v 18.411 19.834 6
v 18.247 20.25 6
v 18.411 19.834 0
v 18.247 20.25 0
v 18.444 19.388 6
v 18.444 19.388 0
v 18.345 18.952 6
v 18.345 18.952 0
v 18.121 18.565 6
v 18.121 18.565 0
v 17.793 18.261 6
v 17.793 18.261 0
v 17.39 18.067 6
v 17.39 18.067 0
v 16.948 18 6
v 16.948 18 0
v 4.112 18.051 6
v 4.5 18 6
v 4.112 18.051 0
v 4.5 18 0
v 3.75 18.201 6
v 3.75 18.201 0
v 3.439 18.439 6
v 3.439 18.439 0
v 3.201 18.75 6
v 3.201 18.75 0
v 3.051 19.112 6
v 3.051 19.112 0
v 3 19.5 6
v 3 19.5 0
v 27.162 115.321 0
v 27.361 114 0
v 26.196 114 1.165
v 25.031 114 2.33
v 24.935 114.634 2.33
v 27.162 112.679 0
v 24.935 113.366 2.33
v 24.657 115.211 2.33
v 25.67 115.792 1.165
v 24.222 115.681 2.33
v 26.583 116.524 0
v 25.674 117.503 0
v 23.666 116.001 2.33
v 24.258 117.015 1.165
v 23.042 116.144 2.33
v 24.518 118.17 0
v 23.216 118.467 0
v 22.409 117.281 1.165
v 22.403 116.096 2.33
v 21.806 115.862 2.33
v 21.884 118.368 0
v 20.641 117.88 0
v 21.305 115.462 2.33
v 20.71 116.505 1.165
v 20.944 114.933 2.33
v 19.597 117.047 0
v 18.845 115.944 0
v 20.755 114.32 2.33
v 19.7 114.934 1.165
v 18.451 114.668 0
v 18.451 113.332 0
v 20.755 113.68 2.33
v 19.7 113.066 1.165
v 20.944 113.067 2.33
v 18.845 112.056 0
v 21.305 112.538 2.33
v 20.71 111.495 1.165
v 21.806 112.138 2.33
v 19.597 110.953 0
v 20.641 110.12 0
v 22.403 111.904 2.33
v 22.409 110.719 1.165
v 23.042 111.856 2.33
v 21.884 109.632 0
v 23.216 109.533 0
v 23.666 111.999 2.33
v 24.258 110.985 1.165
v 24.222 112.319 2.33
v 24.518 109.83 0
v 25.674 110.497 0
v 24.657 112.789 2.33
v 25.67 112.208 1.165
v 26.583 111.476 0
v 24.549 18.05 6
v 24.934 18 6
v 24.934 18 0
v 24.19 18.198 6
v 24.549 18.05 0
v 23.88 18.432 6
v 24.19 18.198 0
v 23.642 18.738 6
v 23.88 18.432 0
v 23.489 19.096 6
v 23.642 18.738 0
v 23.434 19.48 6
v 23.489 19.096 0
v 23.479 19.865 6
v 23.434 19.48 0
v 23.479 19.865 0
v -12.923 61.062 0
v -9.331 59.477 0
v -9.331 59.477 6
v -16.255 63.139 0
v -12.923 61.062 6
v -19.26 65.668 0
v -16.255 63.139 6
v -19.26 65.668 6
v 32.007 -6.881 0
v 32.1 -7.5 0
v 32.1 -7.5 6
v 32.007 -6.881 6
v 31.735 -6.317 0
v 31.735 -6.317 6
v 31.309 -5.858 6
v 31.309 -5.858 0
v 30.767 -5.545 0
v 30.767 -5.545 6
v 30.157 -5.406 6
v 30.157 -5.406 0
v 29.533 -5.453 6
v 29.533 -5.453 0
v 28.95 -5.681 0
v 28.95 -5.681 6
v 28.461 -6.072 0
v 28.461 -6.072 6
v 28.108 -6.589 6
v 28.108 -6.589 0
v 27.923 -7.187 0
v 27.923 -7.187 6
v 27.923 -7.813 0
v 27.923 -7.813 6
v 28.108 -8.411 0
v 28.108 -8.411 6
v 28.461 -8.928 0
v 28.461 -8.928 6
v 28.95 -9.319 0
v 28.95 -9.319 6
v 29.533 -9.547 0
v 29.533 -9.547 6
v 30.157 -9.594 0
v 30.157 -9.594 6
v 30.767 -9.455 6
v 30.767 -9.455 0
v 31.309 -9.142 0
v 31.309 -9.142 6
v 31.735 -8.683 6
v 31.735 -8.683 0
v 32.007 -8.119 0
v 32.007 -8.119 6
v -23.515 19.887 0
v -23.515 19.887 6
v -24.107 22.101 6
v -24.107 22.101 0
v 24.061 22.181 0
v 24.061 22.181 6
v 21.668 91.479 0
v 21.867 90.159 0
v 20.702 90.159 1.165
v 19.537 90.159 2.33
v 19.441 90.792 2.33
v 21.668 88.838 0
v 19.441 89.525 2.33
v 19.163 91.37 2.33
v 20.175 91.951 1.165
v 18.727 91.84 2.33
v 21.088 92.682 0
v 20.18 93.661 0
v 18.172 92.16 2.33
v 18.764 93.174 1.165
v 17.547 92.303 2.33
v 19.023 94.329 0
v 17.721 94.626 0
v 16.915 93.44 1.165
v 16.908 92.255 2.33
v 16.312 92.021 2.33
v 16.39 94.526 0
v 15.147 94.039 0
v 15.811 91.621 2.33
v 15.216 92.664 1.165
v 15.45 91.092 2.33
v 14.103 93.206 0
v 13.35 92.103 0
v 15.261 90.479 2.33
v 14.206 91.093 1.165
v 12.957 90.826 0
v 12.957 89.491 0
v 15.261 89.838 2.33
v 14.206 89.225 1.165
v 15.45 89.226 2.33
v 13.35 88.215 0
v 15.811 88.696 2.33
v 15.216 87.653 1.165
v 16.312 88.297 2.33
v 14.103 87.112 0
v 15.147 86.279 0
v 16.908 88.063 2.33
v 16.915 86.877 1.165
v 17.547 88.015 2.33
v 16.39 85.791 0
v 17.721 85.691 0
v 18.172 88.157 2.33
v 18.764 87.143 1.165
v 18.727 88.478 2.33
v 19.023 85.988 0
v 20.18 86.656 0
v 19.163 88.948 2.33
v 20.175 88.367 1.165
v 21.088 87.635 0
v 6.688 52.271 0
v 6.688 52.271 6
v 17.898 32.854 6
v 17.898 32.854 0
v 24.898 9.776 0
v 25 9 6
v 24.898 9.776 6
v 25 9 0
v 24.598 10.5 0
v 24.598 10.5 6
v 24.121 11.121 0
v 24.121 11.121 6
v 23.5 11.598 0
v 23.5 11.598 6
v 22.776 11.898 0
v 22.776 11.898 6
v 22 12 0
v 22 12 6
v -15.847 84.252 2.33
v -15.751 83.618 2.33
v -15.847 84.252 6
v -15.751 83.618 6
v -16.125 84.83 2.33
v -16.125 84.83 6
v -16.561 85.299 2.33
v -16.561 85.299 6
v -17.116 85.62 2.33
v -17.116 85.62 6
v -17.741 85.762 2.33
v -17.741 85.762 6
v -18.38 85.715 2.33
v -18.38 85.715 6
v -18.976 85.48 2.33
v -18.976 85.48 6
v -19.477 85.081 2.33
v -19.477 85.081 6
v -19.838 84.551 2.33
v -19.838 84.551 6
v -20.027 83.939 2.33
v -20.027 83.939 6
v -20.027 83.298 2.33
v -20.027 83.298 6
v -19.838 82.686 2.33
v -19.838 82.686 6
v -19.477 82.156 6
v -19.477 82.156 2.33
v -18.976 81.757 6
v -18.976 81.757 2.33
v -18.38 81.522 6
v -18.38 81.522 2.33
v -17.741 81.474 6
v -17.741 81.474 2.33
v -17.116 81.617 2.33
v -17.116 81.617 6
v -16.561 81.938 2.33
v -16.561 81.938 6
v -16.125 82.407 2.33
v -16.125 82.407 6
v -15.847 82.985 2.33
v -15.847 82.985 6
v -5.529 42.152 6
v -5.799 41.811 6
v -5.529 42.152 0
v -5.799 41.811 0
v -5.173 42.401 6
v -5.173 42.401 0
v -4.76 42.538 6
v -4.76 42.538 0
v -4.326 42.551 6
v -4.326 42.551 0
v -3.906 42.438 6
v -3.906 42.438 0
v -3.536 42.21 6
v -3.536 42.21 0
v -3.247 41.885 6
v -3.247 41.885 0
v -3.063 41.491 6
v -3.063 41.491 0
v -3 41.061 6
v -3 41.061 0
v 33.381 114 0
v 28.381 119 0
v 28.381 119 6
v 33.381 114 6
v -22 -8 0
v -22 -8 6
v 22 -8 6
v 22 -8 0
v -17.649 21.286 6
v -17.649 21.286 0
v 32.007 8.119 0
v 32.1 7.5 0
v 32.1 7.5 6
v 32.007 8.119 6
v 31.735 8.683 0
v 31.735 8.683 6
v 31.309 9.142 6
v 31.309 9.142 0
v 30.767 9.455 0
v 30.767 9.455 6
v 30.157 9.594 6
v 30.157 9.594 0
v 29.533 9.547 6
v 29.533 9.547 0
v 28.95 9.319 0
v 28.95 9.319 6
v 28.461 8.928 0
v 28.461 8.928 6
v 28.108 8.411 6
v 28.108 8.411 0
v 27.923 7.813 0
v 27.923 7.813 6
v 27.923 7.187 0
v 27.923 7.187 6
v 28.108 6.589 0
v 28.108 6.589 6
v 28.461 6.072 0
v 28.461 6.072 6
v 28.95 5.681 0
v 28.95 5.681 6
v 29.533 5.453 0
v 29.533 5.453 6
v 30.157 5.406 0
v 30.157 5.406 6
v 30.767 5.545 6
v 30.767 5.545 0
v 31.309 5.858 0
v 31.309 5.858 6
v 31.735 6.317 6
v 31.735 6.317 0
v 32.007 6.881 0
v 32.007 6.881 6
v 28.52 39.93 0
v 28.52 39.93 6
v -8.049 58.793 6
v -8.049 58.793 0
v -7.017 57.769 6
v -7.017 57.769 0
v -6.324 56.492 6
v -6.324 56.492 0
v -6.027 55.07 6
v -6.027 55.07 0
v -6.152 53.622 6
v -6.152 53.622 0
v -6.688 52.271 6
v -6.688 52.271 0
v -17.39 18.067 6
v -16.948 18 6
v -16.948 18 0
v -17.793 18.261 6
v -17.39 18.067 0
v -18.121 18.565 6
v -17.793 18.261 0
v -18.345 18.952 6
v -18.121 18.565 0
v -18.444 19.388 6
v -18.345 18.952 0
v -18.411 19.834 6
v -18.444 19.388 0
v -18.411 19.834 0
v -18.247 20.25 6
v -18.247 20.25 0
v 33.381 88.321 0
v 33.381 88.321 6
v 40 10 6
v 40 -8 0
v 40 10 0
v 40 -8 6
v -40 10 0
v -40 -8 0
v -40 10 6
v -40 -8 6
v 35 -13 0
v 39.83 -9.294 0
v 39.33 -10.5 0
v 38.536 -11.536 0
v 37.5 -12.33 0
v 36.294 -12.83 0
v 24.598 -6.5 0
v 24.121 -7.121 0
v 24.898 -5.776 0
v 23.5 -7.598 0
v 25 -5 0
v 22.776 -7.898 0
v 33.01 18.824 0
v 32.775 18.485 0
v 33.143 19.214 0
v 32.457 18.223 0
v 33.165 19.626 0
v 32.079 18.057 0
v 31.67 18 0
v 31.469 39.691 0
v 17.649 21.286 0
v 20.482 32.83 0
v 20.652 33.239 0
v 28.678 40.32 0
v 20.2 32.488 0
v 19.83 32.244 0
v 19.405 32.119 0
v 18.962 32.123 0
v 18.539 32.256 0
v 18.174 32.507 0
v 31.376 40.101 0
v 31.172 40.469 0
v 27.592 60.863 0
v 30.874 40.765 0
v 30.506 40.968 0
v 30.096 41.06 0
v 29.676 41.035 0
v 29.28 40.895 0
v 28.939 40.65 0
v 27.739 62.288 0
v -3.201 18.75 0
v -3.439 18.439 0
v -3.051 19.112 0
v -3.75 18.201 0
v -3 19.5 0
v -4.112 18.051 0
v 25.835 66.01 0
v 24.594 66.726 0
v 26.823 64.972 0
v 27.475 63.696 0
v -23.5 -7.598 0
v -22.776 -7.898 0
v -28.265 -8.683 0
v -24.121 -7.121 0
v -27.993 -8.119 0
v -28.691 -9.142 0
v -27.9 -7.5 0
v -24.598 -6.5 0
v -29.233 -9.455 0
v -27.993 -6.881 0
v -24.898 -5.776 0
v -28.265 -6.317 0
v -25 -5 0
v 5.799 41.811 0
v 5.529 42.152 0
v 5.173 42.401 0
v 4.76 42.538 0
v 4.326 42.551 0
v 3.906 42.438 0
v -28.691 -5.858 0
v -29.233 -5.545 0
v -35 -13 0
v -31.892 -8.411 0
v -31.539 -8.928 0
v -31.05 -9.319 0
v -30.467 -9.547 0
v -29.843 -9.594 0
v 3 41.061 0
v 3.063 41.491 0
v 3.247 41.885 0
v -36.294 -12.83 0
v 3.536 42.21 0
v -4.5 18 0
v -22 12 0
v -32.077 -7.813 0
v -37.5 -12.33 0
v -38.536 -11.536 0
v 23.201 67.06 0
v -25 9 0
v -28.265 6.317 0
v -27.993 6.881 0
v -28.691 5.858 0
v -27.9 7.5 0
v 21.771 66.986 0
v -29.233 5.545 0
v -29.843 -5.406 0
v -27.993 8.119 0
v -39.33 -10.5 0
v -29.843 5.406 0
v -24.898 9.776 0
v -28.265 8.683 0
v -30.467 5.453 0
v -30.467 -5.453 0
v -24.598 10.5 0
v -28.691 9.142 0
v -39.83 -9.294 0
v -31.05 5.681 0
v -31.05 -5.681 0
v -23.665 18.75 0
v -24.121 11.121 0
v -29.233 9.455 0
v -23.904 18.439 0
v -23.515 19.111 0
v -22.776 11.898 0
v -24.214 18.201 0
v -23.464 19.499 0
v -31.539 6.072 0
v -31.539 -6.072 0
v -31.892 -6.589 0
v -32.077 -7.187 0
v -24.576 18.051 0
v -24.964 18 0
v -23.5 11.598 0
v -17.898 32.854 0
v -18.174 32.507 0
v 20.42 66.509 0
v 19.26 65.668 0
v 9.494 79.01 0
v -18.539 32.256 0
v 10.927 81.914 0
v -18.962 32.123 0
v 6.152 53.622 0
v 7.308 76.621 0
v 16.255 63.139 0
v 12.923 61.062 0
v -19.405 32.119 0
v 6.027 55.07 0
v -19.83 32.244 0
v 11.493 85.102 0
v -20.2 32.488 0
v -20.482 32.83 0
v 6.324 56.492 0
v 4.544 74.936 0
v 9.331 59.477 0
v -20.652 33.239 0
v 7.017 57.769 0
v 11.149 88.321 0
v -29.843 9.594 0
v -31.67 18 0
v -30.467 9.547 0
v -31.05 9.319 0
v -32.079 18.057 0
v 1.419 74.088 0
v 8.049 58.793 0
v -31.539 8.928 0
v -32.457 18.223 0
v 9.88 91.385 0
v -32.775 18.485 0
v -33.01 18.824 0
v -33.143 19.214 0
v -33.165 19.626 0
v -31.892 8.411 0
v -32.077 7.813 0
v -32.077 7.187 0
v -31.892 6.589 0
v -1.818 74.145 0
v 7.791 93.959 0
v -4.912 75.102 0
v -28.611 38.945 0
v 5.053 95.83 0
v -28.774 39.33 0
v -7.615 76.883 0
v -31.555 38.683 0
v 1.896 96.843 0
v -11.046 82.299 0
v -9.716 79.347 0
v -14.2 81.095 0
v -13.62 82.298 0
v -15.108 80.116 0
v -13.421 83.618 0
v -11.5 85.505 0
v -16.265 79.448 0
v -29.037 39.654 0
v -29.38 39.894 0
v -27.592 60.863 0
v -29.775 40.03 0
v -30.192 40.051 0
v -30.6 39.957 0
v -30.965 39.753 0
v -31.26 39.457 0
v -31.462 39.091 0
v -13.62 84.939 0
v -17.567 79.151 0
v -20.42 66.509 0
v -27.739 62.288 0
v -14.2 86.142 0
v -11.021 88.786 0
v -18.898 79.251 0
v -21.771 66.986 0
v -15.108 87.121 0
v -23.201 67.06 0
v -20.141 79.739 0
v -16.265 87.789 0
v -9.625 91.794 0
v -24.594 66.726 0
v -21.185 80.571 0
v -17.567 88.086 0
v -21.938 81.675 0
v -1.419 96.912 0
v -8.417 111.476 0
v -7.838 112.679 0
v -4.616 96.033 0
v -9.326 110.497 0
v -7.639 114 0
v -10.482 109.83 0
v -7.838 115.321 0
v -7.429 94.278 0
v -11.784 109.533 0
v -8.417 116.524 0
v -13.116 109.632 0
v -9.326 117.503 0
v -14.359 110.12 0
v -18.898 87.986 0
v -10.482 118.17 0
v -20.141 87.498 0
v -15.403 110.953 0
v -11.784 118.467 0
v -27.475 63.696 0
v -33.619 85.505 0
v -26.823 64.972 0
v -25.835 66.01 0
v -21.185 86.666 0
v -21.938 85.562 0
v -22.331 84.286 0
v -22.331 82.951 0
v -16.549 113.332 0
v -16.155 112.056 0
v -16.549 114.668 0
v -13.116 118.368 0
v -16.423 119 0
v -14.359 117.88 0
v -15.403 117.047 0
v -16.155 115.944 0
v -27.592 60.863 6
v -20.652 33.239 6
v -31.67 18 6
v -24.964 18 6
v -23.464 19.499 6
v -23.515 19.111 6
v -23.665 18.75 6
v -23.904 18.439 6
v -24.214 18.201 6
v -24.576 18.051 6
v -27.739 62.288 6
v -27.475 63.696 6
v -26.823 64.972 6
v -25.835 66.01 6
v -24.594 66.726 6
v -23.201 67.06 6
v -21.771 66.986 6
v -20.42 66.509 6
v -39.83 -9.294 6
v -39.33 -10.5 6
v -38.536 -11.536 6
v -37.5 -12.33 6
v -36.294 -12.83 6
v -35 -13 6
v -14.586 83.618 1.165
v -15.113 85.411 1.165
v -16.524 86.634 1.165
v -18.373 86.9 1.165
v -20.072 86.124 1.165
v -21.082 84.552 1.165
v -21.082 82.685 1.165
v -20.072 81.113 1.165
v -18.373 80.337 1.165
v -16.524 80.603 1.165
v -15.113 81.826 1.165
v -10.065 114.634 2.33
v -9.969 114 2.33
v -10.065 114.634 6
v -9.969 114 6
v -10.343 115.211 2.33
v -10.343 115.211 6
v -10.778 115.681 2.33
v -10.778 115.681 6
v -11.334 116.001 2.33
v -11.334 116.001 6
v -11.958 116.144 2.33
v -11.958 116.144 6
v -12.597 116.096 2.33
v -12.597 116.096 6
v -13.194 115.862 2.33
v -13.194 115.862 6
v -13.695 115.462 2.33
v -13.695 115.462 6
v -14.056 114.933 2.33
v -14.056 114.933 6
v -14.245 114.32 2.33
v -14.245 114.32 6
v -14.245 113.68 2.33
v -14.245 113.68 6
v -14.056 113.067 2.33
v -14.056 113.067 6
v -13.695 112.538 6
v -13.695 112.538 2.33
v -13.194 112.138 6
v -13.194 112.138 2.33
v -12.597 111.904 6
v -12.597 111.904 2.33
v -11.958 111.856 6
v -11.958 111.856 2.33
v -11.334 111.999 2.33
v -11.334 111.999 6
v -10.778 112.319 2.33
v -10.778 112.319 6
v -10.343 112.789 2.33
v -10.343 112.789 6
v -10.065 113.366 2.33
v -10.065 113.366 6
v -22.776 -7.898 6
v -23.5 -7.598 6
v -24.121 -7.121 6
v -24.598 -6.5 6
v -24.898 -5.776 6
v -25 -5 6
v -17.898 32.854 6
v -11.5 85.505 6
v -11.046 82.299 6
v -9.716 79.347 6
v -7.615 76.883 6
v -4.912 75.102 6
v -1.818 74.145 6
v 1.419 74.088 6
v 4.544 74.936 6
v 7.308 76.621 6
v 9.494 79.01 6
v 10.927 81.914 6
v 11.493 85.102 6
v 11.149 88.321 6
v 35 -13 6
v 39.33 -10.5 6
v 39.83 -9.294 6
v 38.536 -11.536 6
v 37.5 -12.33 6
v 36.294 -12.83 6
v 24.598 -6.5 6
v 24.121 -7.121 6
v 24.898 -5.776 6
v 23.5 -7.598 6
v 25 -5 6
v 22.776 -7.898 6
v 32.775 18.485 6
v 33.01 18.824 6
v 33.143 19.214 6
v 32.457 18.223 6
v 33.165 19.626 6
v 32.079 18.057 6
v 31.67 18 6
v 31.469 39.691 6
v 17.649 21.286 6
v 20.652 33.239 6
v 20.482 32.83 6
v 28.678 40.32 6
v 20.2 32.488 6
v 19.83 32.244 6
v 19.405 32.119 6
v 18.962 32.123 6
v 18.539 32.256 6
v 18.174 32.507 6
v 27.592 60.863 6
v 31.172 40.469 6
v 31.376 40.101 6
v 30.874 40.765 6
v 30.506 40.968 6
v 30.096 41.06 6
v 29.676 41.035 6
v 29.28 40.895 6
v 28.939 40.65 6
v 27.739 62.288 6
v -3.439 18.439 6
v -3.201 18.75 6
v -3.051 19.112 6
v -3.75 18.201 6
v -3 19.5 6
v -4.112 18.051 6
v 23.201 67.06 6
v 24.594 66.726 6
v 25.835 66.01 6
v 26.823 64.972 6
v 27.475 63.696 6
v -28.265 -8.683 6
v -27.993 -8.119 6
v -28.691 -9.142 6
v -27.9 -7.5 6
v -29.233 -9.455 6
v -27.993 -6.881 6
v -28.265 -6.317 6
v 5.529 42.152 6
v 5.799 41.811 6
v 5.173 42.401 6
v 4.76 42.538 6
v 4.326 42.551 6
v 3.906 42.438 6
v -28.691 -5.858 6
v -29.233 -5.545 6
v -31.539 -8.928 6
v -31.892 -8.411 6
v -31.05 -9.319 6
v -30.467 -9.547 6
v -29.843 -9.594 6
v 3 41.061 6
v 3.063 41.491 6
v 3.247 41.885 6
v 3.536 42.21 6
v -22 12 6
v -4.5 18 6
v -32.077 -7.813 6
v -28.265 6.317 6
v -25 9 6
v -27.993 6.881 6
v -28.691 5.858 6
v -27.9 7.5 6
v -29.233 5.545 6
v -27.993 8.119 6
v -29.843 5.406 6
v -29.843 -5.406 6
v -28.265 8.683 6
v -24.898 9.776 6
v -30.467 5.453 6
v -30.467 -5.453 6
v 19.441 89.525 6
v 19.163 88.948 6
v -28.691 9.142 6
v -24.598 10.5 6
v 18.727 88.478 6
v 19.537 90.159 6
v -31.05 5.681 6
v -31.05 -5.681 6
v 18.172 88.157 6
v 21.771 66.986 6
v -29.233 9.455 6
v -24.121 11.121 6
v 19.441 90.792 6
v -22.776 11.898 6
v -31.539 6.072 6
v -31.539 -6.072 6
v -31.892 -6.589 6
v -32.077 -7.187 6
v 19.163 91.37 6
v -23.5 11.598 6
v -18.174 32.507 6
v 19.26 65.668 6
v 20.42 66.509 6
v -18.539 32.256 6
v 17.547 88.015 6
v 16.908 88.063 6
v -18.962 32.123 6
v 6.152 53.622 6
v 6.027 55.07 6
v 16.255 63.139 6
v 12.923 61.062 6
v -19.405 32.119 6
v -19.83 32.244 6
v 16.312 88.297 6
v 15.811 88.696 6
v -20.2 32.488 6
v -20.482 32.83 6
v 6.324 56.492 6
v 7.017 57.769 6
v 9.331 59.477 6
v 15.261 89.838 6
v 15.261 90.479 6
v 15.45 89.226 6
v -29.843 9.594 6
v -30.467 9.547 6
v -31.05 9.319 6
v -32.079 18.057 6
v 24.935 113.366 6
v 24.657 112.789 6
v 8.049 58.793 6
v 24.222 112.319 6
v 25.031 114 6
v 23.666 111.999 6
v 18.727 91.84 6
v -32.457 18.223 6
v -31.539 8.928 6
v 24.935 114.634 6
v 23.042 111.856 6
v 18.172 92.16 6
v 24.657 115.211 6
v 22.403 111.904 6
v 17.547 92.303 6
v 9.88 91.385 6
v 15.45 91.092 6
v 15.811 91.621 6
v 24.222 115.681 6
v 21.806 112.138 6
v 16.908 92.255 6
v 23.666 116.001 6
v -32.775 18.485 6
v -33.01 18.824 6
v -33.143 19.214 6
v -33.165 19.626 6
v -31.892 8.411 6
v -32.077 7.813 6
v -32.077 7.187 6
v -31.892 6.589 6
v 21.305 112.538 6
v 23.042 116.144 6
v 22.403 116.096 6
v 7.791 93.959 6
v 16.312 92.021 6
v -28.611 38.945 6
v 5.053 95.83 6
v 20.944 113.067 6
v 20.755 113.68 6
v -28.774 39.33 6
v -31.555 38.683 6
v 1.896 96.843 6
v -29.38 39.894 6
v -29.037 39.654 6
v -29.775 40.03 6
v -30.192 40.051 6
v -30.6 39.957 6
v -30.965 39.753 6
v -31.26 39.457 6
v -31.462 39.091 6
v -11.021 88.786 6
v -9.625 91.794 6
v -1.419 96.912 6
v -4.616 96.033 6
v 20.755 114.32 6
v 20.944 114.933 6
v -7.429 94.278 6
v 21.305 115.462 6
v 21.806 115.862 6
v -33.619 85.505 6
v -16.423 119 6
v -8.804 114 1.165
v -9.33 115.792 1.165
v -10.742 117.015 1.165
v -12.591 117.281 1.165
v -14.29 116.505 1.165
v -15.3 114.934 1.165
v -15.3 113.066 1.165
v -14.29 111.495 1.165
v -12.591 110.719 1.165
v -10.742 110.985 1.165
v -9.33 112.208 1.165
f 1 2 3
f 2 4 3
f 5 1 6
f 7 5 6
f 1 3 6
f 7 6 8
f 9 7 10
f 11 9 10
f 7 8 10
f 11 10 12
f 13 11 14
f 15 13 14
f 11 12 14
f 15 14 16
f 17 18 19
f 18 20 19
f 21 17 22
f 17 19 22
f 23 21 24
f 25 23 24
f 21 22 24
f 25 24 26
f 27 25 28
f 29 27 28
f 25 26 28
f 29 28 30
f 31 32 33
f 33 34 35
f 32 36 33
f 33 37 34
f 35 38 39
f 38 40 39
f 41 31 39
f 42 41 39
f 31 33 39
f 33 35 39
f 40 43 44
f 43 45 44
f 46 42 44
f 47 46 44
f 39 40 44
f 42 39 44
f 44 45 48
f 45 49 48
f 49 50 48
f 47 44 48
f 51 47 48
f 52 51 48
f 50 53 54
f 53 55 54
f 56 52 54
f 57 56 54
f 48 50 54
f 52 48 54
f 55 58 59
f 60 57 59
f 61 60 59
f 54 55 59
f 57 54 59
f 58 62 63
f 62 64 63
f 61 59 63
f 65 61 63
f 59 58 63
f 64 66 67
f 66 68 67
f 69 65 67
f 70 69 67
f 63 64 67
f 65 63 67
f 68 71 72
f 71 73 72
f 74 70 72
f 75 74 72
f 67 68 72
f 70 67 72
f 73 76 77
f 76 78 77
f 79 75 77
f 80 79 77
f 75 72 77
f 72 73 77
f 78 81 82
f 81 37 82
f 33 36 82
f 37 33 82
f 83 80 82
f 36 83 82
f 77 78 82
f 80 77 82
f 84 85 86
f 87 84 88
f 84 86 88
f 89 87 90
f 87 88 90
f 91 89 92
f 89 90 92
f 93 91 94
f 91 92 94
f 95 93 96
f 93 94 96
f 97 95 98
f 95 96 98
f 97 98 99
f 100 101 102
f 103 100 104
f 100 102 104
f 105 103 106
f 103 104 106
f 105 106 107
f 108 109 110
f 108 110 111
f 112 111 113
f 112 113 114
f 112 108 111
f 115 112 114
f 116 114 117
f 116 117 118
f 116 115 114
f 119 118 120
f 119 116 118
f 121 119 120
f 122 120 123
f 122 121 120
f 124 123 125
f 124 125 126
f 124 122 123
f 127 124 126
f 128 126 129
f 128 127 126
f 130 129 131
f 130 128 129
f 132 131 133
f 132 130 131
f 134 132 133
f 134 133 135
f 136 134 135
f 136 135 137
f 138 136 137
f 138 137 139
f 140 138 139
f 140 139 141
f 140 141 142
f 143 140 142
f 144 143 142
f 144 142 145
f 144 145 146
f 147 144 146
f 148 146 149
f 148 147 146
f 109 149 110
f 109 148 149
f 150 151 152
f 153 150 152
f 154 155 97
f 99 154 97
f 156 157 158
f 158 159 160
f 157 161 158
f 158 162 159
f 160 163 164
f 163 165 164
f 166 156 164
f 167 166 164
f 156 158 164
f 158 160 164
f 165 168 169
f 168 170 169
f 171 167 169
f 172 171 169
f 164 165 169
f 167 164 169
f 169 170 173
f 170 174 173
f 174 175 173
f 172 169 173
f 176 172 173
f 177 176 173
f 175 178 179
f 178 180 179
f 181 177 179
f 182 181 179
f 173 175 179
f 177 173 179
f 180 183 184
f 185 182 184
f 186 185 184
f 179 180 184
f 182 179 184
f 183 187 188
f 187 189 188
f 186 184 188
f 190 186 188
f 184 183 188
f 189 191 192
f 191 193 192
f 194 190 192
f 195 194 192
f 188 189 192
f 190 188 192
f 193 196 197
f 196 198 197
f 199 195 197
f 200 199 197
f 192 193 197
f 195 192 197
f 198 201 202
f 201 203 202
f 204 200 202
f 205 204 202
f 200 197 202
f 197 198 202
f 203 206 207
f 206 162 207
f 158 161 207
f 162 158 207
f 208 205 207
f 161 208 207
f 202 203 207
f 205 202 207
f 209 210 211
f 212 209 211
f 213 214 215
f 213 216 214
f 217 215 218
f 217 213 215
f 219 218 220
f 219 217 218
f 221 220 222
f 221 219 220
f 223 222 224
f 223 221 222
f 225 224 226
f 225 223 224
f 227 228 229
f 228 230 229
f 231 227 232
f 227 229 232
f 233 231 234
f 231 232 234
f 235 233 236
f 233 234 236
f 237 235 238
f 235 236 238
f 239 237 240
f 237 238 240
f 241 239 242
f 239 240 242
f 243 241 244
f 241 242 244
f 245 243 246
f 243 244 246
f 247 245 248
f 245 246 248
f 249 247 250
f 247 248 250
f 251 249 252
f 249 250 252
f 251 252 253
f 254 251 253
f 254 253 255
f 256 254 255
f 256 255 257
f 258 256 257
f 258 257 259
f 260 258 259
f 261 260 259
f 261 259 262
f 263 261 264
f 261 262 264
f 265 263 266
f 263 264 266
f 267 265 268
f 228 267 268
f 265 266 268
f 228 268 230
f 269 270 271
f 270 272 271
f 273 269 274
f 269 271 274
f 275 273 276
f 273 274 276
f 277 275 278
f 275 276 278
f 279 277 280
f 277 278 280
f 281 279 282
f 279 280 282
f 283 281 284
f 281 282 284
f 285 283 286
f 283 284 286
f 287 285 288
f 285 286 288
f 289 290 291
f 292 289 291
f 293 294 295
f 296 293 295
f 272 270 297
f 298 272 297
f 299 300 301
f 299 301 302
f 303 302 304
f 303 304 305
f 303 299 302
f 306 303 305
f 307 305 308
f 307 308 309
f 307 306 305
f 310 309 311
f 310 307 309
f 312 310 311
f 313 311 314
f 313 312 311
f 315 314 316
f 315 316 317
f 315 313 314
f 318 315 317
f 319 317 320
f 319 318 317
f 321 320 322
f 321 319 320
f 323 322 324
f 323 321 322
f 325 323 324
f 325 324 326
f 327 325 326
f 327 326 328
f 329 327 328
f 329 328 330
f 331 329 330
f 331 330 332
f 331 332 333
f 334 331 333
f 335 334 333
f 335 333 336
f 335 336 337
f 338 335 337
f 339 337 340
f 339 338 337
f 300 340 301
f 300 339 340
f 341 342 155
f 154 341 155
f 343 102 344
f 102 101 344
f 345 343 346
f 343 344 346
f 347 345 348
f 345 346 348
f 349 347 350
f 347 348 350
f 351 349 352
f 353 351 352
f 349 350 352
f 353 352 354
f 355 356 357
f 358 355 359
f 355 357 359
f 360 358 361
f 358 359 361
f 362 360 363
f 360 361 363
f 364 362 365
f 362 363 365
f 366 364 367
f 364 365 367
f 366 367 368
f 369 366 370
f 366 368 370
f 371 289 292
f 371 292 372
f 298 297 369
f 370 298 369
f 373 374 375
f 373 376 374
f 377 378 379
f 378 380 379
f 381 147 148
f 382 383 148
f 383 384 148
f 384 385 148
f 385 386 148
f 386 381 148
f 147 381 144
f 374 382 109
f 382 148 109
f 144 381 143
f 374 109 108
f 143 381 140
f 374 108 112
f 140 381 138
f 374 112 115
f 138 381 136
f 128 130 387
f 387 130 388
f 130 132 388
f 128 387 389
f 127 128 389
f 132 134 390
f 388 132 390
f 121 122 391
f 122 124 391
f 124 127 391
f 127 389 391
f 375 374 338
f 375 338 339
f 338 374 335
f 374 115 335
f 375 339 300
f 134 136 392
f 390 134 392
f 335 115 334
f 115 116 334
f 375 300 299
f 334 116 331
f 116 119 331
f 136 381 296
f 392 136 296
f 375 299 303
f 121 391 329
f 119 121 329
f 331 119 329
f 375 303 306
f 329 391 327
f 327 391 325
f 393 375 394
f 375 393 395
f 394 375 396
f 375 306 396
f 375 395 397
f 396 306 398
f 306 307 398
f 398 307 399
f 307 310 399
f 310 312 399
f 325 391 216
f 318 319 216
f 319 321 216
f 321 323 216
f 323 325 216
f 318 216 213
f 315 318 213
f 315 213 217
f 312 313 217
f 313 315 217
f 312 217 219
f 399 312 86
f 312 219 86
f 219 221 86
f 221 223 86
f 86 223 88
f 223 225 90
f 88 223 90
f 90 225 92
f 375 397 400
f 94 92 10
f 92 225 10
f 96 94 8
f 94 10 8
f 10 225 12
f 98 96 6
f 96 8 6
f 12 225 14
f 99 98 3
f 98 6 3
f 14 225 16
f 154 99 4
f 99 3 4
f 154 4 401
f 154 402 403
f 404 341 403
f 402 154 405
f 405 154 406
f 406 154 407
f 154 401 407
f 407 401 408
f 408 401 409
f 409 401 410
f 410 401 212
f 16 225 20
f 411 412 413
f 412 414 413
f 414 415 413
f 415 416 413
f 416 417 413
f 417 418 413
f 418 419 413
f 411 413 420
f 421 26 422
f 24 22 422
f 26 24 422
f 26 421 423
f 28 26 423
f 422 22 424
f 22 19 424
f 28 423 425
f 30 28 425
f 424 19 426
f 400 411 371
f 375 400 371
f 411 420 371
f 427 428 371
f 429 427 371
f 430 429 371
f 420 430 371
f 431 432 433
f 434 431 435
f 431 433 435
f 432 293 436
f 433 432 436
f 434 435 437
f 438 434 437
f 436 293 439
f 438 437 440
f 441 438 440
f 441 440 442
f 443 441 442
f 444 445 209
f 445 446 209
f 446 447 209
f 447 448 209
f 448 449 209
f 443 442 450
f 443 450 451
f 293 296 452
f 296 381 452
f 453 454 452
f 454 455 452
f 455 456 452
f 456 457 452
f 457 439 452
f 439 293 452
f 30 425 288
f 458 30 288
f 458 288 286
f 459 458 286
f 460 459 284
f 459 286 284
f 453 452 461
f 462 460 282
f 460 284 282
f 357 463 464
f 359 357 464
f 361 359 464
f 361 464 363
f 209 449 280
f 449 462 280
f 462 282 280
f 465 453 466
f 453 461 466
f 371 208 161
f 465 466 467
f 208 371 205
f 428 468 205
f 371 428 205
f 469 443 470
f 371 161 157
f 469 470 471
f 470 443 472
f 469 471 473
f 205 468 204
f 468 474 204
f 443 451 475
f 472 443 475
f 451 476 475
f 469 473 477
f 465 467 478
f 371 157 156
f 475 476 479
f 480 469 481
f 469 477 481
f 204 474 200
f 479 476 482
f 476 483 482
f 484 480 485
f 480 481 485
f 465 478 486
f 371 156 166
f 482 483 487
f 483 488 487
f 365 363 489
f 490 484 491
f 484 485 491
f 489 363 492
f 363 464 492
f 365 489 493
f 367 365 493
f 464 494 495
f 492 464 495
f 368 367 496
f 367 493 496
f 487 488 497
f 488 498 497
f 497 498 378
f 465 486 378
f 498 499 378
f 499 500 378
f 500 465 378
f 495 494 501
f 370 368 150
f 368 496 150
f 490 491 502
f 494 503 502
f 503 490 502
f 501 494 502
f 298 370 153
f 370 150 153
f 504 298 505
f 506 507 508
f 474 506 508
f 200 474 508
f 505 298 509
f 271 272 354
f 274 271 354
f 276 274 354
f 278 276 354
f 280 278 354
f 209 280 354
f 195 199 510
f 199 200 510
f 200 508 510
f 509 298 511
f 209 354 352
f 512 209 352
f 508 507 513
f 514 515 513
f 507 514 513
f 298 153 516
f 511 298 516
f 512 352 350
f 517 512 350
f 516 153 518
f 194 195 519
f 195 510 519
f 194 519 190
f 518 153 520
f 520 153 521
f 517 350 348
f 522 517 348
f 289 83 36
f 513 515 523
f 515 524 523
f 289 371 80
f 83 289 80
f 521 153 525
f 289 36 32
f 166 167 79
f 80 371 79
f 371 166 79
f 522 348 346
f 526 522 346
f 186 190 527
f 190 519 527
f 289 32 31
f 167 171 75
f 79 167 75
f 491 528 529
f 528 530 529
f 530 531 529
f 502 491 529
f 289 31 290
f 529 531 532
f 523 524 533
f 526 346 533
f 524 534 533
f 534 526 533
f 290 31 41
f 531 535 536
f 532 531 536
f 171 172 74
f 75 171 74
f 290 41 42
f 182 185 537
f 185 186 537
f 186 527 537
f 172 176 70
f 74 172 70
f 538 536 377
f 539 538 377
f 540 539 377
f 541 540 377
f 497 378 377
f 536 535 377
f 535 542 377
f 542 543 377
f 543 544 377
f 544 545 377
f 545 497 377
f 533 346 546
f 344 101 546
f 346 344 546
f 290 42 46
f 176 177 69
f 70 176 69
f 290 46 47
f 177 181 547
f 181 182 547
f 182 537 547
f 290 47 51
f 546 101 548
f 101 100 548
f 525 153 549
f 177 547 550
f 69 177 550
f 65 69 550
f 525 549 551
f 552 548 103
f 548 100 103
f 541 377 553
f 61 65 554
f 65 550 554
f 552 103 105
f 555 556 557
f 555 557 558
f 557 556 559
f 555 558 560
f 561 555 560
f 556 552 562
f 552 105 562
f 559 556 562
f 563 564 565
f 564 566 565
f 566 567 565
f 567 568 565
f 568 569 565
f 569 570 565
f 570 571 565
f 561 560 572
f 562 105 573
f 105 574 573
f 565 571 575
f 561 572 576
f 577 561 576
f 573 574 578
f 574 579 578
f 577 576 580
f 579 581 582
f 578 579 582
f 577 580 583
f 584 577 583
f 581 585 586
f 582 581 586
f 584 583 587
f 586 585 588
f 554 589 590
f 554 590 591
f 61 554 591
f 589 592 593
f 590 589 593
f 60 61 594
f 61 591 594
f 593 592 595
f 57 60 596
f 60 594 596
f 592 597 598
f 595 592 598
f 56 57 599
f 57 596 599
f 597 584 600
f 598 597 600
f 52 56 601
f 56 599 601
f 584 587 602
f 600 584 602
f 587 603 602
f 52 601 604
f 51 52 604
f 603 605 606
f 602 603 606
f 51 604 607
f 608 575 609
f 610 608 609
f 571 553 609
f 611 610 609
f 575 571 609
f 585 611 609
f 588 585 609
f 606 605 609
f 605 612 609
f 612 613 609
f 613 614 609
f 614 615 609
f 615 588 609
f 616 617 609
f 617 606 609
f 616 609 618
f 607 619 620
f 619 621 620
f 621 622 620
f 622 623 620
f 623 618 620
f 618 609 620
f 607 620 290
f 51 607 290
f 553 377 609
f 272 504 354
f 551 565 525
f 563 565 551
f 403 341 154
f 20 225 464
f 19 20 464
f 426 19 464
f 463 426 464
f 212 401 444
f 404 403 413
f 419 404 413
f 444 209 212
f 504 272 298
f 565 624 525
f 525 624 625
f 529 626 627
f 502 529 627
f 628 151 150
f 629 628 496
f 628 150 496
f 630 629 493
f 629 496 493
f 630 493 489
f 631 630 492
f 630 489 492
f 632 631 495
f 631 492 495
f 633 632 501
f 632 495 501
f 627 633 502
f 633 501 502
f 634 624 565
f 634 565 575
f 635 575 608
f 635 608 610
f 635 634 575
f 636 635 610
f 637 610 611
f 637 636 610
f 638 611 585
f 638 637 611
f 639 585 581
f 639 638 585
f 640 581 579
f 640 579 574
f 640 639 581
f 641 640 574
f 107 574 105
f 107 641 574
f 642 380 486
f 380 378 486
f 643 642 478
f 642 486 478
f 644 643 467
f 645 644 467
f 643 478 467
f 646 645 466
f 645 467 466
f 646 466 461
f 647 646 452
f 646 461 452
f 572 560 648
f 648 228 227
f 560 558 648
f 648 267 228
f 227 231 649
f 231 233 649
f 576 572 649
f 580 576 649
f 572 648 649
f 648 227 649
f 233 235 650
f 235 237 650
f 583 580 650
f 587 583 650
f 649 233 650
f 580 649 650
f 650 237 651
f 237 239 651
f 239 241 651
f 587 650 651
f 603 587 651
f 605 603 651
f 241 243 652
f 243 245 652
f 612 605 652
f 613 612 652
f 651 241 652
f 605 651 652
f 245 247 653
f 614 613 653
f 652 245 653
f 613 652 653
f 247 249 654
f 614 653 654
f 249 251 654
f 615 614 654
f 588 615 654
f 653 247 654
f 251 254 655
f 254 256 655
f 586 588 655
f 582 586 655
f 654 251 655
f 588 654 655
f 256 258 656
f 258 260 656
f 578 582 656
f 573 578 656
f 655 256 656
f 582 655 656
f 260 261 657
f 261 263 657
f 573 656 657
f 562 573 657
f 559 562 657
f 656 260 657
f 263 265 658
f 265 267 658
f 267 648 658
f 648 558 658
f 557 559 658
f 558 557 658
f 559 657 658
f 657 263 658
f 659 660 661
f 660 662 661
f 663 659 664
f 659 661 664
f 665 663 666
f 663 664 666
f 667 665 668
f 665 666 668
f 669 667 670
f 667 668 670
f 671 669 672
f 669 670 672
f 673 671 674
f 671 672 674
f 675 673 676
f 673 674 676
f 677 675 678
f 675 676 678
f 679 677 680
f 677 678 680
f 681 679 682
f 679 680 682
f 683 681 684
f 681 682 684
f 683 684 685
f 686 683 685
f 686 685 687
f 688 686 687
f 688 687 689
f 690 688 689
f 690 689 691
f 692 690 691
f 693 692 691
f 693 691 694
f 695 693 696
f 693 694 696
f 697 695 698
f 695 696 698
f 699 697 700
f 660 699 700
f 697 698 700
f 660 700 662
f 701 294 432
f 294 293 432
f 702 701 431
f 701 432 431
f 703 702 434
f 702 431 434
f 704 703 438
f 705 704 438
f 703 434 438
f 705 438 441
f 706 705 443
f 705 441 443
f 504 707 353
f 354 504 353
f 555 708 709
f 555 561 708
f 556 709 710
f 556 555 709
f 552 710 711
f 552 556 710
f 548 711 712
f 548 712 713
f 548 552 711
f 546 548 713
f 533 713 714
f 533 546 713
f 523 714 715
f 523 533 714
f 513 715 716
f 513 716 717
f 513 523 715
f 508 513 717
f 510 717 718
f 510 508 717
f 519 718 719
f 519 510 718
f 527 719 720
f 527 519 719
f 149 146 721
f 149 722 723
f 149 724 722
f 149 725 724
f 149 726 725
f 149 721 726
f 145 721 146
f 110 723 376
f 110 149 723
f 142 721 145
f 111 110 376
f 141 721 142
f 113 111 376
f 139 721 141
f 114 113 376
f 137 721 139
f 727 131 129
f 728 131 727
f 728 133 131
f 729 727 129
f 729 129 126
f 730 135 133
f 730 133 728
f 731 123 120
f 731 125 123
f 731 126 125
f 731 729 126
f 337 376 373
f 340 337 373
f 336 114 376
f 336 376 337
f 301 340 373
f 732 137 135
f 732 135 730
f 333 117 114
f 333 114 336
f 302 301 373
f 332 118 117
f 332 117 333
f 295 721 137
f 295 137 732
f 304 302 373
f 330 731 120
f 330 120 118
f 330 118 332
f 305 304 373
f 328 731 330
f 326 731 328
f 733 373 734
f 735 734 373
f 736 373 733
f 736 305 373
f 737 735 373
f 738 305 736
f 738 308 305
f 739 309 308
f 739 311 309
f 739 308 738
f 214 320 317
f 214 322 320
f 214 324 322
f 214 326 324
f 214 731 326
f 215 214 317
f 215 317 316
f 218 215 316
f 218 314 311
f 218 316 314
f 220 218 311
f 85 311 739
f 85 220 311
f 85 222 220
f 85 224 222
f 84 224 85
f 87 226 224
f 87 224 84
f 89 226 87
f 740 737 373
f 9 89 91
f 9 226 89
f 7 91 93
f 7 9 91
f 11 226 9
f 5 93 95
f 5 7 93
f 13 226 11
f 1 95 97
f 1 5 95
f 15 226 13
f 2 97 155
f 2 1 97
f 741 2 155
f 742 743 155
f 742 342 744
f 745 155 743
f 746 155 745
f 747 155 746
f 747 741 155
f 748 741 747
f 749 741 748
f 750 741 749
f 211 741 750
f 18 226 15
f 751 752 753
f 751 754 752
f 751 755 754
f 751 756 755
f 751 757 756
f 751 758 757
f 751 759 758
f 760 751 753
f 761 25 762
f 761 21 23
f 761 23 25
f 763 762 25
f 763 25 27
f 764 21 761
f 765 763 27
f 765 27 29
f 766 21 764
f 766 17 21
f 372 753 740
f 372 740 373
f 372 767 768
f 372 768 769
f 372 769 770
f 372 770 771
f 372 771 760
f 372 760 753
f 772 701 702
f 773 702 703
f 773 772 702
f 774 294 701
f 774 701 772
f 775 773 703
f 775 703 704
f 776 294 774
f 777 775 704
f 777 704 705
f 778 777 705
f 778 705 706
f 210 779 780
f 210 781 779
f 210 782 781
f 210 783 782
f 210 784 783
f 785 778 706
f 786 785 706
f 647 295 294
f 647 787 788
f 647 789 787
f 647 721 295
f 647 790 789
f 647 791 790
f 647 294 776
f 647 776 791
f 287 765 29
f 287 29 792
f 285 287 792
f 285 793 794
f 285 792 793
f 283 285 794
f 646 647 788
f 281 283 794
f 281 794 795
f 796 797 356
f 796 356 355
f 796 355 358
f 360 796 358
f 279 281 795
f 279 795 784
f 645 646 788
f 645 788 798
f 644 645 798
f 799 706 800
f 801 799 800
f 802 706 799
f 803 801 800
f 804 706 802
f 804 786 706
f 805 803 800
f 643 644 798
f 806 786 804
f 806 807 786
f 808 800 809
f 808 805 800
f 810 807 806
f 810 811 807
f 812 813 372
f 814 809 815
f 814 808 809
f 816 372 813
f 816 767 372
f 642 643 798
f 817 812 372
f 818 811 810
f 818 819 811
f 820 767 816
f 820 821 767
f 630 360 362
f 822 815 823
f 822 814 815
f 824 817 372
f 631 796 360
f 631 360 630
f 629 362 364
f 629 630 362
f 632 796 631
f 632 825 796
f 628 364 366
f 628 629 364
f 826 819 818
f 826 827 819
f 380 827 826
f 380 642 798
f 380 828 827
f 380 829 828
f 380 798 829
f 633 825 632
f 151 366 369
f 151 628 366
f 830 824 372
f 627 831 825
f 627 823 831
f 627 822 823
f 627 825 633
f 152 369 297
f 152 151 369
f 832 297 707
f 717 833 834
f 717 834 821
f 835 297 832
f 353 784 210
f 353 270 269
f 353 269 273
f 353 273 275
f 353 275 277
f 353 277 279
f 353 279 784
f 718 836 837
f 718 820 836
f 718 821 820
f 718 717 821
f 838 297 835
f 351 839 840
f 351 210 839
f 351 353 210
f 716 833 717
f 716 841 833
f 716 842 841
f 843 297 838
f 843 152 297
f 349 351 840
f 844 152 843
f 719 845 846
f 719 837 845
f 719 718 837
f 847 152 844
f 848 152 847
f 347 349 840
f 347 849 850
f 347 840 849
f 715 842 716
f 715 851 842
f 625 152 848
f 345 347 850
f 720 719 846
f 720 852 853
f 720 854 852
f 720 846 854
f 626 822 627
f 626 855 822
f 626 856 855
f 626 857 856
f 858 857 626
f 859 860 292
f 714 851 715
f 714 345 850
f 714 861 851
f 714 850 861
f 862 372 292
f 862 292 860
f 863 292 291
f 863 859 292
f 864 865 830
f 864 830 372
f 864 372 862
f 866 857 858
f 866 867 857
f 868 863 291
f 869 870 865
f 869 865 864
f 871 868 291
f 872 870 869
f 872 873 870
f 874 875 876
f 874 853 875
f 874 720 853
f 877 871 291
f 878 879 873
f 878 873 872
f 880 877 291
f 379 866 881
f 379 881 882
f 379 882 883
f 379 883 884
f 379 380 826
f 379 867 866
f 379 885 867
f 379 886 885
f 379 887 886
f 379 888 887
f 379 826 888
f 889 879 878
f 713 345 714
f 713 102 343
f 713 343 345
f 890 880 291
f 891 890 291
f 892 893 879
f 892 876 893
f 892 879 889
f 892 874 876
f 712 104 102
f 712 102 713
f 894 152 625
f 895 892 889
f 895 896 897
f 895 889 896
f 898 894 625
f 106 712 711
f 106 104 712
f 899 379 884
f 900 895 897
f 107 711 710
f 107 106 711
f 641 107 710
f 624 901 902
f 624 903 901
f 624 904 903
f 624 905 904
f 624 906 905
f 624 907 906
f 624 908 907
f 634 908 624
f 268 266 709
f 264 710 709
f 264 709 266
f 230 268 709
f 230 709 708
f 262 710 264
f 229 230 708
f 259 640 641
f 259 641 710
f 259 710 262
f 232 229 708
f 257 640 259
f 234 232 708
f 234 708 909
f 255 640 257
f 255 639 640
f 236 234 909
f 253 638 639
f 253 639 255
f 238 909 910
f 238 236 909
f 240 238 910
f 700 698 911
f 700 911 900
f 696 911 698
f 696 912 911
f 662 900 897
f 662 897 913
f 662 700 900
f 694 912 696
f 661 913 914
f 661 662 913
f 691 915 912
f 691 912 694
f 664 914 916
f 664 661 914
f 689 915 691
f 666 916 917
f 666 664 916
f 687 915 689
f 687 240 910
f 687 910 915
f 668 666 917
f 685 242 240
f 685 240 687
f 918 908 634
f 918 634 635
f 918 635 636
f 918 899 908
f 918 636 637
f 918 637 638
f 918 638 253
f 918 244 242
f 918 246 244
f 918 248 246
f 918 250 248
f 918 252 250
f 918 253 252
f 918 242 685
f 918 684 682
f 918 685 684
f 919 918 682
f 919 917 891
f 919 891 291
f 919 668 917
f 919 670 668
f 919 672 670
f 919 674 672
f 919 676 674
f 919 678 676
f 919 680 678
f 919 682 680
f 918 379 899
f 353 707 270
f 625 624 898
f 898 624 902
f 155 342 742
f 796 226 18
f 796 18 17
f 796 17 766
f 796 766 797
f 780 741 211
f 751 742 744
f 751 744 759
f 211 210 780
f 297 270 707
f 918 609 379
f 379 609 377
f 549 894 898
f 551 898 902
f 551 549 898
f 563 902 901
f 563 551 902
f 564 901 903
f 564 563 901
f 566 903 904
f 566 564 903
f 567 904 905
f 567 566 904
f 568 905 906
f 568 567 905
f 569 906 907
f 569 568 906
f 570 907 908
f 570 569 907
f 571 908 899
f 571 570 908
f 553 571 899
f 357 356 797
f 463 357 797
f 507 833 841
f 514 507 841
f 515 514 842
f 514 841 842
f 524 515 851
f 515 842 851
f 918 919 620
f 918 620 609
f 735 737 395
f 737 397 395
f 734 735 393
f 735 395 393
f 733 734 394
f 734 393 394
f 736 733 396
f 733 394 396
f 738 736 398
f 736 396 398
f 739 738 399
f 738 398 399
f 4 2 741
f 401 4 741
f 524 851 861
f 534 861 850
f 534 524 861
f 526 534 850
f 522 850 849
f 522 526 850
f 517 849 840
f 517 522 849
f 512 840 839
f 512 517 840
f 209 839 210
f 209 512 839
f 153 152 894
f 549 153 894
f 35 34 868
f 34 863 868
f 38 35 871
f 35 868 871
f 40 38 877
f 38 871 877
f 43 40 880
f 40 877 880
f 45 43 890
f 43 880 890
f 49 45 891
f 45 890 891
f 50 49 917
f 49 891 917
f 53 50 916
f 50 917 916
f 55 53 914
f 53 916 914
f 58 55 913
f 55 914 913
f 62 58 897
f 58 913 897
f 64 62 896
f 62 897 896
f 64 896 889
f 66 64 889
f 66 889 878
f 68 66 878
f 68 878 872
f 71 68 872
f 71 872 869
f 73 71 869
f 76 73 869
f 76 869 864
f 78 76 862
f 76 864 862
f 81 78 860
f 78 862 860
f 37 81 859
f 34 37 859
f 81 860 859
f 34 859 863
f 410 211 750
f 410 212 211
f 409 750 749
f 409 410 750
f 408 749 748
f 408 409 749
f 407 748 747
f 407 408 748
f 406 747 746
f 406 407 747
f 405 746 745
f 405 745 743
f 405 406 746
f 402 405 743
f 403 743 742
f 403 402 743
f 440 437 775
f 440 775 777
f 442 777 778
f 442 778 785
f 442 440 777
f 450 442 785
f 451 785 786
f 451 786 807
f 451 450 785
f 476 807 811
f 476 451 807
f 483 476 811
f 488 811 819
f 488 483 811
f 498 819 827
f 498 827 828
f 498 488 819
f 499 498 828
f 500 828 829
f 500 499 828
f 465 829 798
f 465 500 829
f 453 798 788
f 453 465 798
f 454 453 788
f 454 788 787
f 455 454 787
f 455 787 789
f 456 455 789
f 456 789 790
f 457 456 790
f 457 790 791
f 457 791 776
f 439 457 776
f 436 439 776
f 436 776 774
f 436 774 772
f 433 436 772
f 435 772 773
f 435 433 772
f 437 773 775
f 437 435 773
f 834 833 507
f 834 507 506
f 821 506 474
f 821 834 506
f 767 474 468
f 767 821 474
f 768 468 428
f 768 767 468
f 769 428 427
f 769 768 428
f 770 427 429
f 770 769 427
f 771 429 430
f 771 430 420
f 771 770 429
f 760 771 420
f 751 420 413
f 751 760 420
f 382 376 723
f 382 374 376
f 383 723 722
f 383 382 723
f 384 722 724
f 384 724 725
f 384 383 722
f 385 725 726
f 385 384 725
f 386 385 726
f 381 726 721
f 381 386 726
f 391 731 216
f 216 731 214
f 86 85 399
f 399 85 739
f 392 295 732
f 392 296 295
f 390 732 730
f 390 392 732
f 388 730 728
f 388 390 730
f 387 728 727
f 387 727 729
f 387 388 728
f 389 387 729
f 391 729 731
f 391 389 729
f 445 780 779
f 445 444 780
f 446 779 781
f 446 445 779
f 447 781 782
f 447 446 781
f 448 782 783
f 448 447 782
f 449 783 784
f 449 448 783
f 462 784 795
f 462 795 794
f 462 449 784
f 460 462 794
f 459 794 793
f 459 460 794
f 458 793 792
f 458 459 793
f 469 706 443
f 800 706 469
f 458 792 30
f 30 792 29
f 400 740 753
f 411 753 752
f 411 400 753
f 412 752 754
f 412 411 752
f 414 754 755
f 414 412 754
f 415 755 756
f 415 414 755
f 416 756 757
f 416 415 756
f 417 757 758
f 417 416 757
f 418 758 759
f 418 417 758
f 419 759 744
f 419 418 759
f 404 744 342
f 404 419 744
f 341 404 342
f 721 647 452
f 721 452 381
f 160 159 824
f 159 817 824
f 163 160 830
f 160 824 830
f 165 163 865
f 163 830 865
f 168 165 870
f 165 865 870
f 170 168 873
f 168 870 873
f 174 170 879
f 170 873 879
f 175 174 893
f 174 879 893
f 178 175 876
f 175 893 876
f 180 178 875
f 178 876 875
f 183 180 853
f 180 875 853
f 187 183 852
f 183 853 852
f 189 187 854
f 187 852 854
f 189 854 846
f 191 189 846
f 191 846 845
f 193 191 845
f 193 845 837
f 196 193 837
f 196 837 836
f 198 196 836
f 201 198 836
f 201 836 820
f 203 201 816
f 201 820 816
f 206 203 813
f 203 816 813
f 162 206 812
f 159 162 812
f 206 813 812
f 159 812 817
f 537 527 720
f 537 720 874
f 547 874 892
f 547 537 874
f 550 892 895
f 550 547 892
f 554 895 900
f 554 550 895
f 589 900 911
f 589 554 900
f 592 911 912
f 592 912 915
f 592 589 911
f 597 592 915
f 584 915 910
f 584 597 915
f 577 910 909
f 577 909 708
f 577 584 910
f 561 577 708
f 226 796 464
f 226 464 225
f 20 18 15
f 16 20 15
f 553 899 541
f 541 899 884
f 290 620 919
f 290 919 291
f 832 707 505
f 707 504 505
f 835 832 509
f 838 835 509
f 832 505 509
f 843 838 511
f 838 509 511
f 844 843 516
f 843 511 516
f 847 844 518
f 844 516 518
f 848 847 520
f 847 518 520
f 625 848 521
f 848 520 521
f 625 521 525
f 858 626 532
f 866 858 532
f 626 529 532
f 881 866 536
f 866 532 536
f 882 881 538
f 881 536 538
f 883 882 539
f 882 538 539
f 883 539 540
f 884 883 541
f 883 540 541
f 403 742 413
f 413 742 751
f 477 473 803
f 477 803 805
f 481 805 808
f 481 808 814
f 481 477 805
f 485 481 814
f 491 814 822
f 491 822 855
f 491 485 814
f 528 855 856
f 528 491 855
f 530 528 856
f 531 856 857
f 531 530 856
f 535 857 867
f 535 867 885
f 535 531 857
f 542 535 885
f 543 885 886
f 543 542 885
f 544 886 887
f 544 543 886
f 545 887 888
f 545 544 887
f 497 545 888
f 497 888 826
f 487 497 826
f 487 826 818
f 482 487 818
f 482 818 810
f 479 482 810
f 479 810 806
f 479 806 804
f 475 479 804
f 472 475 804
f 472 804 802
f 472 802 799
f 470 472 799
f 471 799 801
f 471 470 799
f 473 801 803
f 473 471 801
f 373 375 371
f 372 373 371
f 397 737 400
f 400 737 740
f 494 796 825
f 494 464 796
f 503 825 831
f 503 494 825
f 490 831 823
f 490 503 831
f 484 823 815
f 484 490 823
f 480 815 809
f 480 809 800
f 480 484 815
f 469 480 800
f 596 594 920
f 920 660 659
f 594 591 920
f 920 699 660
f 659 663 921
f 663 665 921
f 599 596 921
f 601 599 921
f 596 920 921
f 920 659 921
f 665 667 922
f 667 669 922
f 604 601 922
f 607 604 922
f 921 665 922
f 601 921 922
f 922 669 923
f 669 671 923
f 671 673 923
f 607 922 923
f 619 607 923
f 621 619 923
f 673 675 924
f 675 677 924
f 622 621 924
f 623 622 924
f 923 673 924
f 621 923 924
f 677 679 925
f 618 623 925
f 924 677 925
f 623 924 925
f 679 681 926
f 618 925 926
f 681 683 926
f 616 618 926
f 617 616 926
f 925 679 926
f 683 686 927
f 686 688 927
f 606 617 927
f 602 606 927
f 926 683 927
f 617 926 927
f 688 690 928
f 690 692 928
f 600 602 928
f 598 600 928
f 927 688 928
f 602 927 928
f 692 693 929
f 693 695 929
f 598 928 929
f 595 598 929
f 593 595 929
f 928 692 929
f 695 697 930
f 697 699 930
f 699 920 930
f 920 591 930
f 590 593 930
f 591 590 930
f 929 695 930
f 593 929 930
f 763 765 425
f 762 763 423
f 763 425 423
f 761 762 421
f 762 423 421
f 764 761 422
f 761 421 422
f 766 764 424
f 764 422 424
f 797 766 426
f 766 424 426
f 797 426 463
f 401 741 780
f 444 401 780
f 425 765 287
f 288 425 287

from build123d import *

# Parameters (mm, degrees)
SKETCH_1_R                   = 33.5
SKETCH_1_R_2                 = 11.5
SKETCH_1_W                   = 80
SKETCH_1_H                   = 20
SKETCH_1_R_3                 = 2.1
EXTRUDE_1_DEPTH              = 6
SKETCH_3_W                   = 80
SKETCH_3_H                   = 3
EXTRUDE_2_DEPTH              = 6
FILLET_1_R                   = 5
EXTRUDE_START                = -6
EXTRUDE_3_DEPTH              = 6
SKETCH_5_R                   = 2
CUT_EXTRUDE_1_DEPTH          = 126.686116974
HOLE_WIZARD_M4_1_D           = 4.3
HOLE_WIZARD_M4_1_DEPTH       = 10
HOLE_WIZARD_M4_1_CSINK_D     = 8.96
HOLE_WIZARD_M4_1_CSINK_ANGLE = 90
HOLE_WIZARD_M4_1_TIP         = 1.291850331
SKETCH_8_R                   = 2.1
CUT_EXTRUDE_2_DEPTH          = 10
HOLE_WIZARD_M4_2_D           = 4.3
HOLE_WIZARD_M4_2_DEPTH       = 10
HOLE_WIZARD_M4_2_CSINK_D     = 8.96
HOLE_WIZARD_M4_2_CSINK_ANGLE = 90
HOLE_WIZARD_M4_2_TIP         = 1.291850331
CHAMFER_1_SIZE               = 5
CUT_EXTRUDE_3_DEPTH          = 126.686116974
SKETCH_13_W                  = 50
SKETCH_13_H                  = 20
CUT_EXTRUDE_5_DEPTH          = 10
FILLET_3_R                   = 3
FILLET_4_R                   = 6
FILLET_5_R                   = 5
FILLET_6_R                   = 1.5
FILLET_7_R                   = 5


with BuildPart() as part:
    # 草图1 → 凸台-拉伸1 (new body)
    # profile 1 of 3: a face of its own
    with BuildSketch(Plane.XY):
        with Locations((0, 85.5)):
            Circle(SKETCH_1_R)
        with Locations((0, 85.5)):
            Circle(SKETCH_1_R_2, mode=Mode.SUBTRACT)
    # profile 2 of 3: a face of its own
    with BuildSketch(Plane.XY):
        with BuildLine():
            Line((-33.38100662, 88.32106311), (-40, 10))
            Line((-40, 10), (40, 10))
            Line((40, 10), (33.38100662, 88.32106311))
            ThreePointArc((33.38100662, 88.32106311), (33.470238435, 86.911785792), (33.5, 85.5))
            ThreePointArc((33.5, 85.5), (-1.411785792, 52.029761565), (-33.38100662, 88.32106311))
        make_face()
    # profile 3 of 3: a face of its own
    with BuildSketch(Plane.XY):
        Rectangle(SKETCH_1_W, SKETCH_1_H)
        with Locations((-30, 7.5)):
            Circle(SKETCH_1_R_3, mode=Mode.SUBTRACT)
        with Locations((30, 7.5)):
            Circle(SKETCH_1_R_3, mode=Mode.SUBTRACT)
        with Locations((30, -7.5)):
            Circle(SKETCH_1_R_3, mode=Mode.SUBTRACT)
        with Locations((-30, -7.5)):
            Circle(SKETCH_1_R_3, mode=Mode.SUBTRACT)
    extrude(amount=EXTRUDE_1_DEPTH)

    # 草图3 → 凸台-拉伸2 (add)
    with BuildSketch(Plane.XY.offset(6)):
        with Locations((0, -11.5)):
            Rectangle(SKETCH_3_W, SKETCH_3_H)
    extrude(amount=-EXTRUDE_2_DEPTH)

    # 圆角1
    fillet_1_edges = [part.edges().sort_by_distance(p)[0] for p in [
        (-40, -13, 3),
        (40, -13, 3),
    ]]
    fillet(fillet_1_edges, radius=FILLET_1_R)

    # 草图4 → 凸台-拉伸3 (add)
    with BuildSketch(Plane.XY.offset(6).offset(EXTRUDE_START)):
        with BuildLine():
            Line((33.38100662, 88.32106311), (11.148614395, 88.32106311))
            ThreePointArc((11.148614395, 88.32106311), (-1.418941021, 96.91212541), (-11.499998905, 85.50501918))
            Line((-11.499998905, 85.50501918), (-33.61899338, 85.50501918))
            Line((-33.61899338, 85.50501918), (-33.61899338, 119))
            Line((-33.61899338, 119), (33.38100662, 119))
            Line((33.38100662, 119), (33.38100662, 88.32106311))
        make_face()
    extrude(amount=EXTRUDE_3_DEPTH)

    # 草图5 → 切除-拉伸1 (cut, through all)
    with BuildSketch(Plane.XY.offset(6)):
        with Locations((-17.901394117, 83.618487661)):
            Circle(SKETCH_5_R)
        with Locations((17.386664873, 90.158742812)):
            Circle(SKETCH_5_R)
    extrude(amount=-CUT_EXTRUDE_1_DEPTH, mode=Mode.SUBTRACT)

    # M4 六角凹锥坑螺钉的锥形沉头孔1
    with Locations(Plane(origin=(0, 0, 0), x_dir=(-1, 0, 0), z_dir=(0, 0, -1))):
        with Locations((-17.386664873, 90.158742812), (17.901394117, 83.618487661)):
            CounterSinkHole(HOLE_WIZARD_M4_1_D / 2, HOLE_WIZARD_M4_1_CSINK_D / 2, depth=HOLE_WIZARD_M4_1_DEPTH, counter_sink_angle=HOLE_WIZARD_M4_1_CSINK_ANGLE)
            with Locations((0, 0, -(HOLE_WIZARD_M4_1_DEPTH + HOLE_WIZARD_M4_1_TIP / 2))):  # 118° drill point
                Cone(0, HOLE_WIZARD_M4_1_D / 2, HOLE_WIZARD_M4_1_TIP, mode=Mode.SUBTRACT)

    # 草图8 → 切除-拉伸2 (cut)
    with BuildSketch(Plane.XY.offset(6)):
        with Locations((-12.118993381, 114)):
            Circle(SKETCH_8_R)
        with Locations((22.881006619, 114)):
            Circle(SKETCH_8_R)
    extrude(amount=-CUT_EXTRUDE_2_DEPTH, mode=Mode.SUBTRACT)

    # M4 六角凹锥坑螺钉的锥形沉头孔2
    with Locations(Plane(origin=(0, 0, 0), x_dir=(-1, 0, 0), z_dir=(0, 0, -1))):
        with Locations((-22.881006619, 114), (12.118993381, 114)):
            CounterSinkHole(HOLE_WIZARD_M4_2_D / 2, HOLE_WIZARD_M4_2_CSINK_D / 2, depth=HOLE_WIZARD_M4_2_DEPTH, counter_sink_angle=HOLE_WIZARD_M4_2_CSINK_ANGLE)
            with Locations((0, 0, -(HOLE_WIZARD_M4_2_DEPTH + HOLE_WIZARD_M4_2_TIP / 2))):  # 118° drill point
                Cone(0, HOLE_WIZARD_M4_2_D / 2, HOLE_WIZARD_M4_2_TIP, mode=Mode.SUBTRACT)

    # 倒角1
    chamfer_1_edges = [part.edges().sort_by_distance(p)[0] for p in [
        (33.38100662, 119, 3),
    ]]
    chamfer(chamfer_1_edges, length=CHAMFER_1_SIZE)

    # 草图11 → 切除-拉伸3 (cut, through all)
    with BuildSketch(Plane.XY.offset(6)):
        Polygon((-33.61899338, 119), (-16.422785999, 119), (-33.61899338, 85.50501918), align=None)
    extrude(amount=-CUT_EXTRUDE_3_DEPTH, mode=Mode.SUBTRACT)

    # 草图13 → 切除-拉伸5 (cut)
    with BuildSketch(Plane.XY.offset(6)):
        with BuildLine():
            Line((-29.15457937, 67.081692819), (-19.750016495, 29.647135893))
            Line((-19.750016495, 29.647135893), (-3.346711376, 58.058493772))
            ThreePointArc((-3.346711376, 58.058493772), (-20.530627933, 66.987030012), (-27.640305628, 84.999754146))
            Line((-27.640305628, 84.999754146), (-29.15457937, 67.081692819))
        make_face()
        Polygon((-24.106901542, 22.100789629), (-30.830808938, 47.247244556), (-33.302523575, 18), (-23.010391923, 18), align=None)
        Polygon((-3, 46.65901549), (-17.649366774, 21.285567939), (-19.546290308, 18), (-3, 18), align=None)
        with BuildLine():
            Line((29.15457937, 67.081692819), (27.640305628, 84.999754146))
            ThreePointArc((27.640305628, 84.999754146), (20.530627933, 66.987030012), (3.346711376, 58.058493772))
            Line((3.346711376, 58.058493772), (19.750016495, 29.647135893))
            Line((19.750016495, 29.647135893), (29.15457937, 67.081692819))
        make_face()
        Polygon((17.649366774, 21.285567939), (3, 46.65901549), (3, 18), (19.546290308, 18), align=None)
        Polygon((33.302523575, 18), (30.711815557, 48.65526652), (24.060716784, 22.180783977), (23.010391923, 18), align=None)
        with Locations((0, 2)):
            Rectangle(SKETCH_13_W, SKETCH_13_H)
    extrude(amount=-CUT_EXTRUDE_5_DEPTH, mode=Mode.SUBTRACT)

    # 圆角3
    fillet_3_edges = [part.edges().sort_by_distance(p)[0] for p in [
        (25, -8, 3),
        (-25, -8, 3),
        (-25, 12, 3),
        (25, 12, 3),
    ]]
    fillet(fillet_3_edges, radius=FILLET_3_R)

    # 圆角4
    # the kernel refuses this fillet: 6 mm, written as the material it adds along each edge
    with BuildSketch(Plane(origin=(27.640305628, 84.999754146, 6), x_dir=(0.08421083909463391, -0.996447958791114, 0), z_dir=(0, 0, -1))) as fillet_4_piece_1:
        with BuildLine():
            CenterArc((21.827755911, 4.605393907), FILLET_4_R, 137.118904636, 93.016882278)
            Line((17.431151142, 8.688268692), (17.343219046, 8.769926188))
            ThreePointArc((17.343219046, 8.769926188), (9.452514246, 2.865624658), (-0.012267388, 0.119371316))
            Line((-0.012267388, 0.119371316), (0, -0.12))
            ThreePointArc((0, -0.12), (8.990966949, -0.12), (17.905017457, -0.092107878))
            Line((17.905017457, -0.092107878), (17.981933897, 0))
        make_face()
    extrude(amount=6)
    with BuildSketch(Plane(origin=(-27.640305628, 84.999754146, 6), x_dir=(-0.08421083909464076, -0.9964479587911135, 0), z_dir=(0, 0, -1))) as fillet_4_piece_2:
        with BuildLine():
            CenterArc((21.827755911, -4.605393907), FILLET_4_R, 129.864213086, 93.016882278)
            Line((17.431151142, -8.688268692), (17.343219046, -8.769926188))
            ThreePointArc((17.343219046, -8.769926188), (9.452514246, -2.865624658), (-0.012267388, -0.119371316))
            Line((-0.012267388, -0.119371316), (0, 0.12))
            ThreePointArc((0, 0.12), (8.990966949, 0.12), (17.905017457, 0.092107878))
            Line((17.905017457, 0.092107878), (17.981933897, 0))
        make_face()
    extrude(amount=6)

    # 圆角5
    fillet_5_edges = [part.edges().sort_by_distance(p)[0] for p in [
        (3.346711376, 58.058493772, 3),
        (-3.346711376, 58.058493772, 3),
    ]]
    fillet(fillet_5_edges, radius=FILLET_5_R)

    # 圆角6
    fillet_6_edges = [part.edges().sort_by_distance(p)[0] for p in [
        (19.546290308, 18, 3),
        (3, 18, 3),
        (3, 46.65901549, 3),
        (19.750016495, 29.647135893, 3),
        (-19.546290308, 18, 3),
        (-3, 46.65901549, 3),
        (-3, 18, 3),
        (-23.010391923, 18, 3),
        (-33.302523575, 18, 3),
        (-30.830808938, 47.247244556, 3),
        (23.010391923, 18, 3),
        (30.711815557, 48.65526652, 3),
        (33.302523575, 18, 3),
        (-19.750016495, 29.647135893, 3),
    ]]
    fillet(fillet_6_edges, radius=FILLET_6_R)

    # 圆角7
    # the kernel refuses this fillet: 5 mm, written as the material it adds along each edge
    with BuildSketch(Plane(origin=(29.15457937, 67.081692819, 6), x_dir=(-0.2436552741241345, -0.9698619011959861, 0), z_dir=(0, 0, -1))) as fillet_7_piece_1:
        with BuildLine():
            CenterArc((6.41210713, 5), FILLET_7_R, 121.736562988, 148.263437012)
            Line((3.782034708, 9.252378047), (3.519027465, 9.677615851))
            ThreePointArc((3.519027465, 9.677615851), (2.06186763, 8.837638689), (-0.427669644, -0.25903412))
            Line((-0.427669644, -0.25903412), (0, -0.5))
            Line((0, -0.5), (6.41210713, -0.5))
            Line((6.41210713, -0.5), (6.41210713, 0))
        make_face()
    extrude(amount=6)
    with BuildSketch(Plane(origin=(-29.15457937, 67.081692819, 6), x_dir=(0.24365527412411786, -0.9698619011959904, 0), z_dir=(0, 0, -1))) as fillet_7_piece_2:
        with BuildLine():
            CenterArc((6.41210713, -5), FILLET_7_R, 90, 148.263437012)
            Line((3.782034708, -9.252378047), (3.519027465, -9.677615851))
            ThreePointArc((3.519027465, -9.677615851), (2.06186763, -8.837638689), (-0.427669644, 0.25903412))
            Line((-0.427669644, 0.25903412), (0, 0.5))
            Line((0, 0.5), (6.41210713, 0.5))
            Line((6.41210713, 0.5), (6.41210713, 0))
        make_face()
    extrude(amount=6)


solid = part.part
